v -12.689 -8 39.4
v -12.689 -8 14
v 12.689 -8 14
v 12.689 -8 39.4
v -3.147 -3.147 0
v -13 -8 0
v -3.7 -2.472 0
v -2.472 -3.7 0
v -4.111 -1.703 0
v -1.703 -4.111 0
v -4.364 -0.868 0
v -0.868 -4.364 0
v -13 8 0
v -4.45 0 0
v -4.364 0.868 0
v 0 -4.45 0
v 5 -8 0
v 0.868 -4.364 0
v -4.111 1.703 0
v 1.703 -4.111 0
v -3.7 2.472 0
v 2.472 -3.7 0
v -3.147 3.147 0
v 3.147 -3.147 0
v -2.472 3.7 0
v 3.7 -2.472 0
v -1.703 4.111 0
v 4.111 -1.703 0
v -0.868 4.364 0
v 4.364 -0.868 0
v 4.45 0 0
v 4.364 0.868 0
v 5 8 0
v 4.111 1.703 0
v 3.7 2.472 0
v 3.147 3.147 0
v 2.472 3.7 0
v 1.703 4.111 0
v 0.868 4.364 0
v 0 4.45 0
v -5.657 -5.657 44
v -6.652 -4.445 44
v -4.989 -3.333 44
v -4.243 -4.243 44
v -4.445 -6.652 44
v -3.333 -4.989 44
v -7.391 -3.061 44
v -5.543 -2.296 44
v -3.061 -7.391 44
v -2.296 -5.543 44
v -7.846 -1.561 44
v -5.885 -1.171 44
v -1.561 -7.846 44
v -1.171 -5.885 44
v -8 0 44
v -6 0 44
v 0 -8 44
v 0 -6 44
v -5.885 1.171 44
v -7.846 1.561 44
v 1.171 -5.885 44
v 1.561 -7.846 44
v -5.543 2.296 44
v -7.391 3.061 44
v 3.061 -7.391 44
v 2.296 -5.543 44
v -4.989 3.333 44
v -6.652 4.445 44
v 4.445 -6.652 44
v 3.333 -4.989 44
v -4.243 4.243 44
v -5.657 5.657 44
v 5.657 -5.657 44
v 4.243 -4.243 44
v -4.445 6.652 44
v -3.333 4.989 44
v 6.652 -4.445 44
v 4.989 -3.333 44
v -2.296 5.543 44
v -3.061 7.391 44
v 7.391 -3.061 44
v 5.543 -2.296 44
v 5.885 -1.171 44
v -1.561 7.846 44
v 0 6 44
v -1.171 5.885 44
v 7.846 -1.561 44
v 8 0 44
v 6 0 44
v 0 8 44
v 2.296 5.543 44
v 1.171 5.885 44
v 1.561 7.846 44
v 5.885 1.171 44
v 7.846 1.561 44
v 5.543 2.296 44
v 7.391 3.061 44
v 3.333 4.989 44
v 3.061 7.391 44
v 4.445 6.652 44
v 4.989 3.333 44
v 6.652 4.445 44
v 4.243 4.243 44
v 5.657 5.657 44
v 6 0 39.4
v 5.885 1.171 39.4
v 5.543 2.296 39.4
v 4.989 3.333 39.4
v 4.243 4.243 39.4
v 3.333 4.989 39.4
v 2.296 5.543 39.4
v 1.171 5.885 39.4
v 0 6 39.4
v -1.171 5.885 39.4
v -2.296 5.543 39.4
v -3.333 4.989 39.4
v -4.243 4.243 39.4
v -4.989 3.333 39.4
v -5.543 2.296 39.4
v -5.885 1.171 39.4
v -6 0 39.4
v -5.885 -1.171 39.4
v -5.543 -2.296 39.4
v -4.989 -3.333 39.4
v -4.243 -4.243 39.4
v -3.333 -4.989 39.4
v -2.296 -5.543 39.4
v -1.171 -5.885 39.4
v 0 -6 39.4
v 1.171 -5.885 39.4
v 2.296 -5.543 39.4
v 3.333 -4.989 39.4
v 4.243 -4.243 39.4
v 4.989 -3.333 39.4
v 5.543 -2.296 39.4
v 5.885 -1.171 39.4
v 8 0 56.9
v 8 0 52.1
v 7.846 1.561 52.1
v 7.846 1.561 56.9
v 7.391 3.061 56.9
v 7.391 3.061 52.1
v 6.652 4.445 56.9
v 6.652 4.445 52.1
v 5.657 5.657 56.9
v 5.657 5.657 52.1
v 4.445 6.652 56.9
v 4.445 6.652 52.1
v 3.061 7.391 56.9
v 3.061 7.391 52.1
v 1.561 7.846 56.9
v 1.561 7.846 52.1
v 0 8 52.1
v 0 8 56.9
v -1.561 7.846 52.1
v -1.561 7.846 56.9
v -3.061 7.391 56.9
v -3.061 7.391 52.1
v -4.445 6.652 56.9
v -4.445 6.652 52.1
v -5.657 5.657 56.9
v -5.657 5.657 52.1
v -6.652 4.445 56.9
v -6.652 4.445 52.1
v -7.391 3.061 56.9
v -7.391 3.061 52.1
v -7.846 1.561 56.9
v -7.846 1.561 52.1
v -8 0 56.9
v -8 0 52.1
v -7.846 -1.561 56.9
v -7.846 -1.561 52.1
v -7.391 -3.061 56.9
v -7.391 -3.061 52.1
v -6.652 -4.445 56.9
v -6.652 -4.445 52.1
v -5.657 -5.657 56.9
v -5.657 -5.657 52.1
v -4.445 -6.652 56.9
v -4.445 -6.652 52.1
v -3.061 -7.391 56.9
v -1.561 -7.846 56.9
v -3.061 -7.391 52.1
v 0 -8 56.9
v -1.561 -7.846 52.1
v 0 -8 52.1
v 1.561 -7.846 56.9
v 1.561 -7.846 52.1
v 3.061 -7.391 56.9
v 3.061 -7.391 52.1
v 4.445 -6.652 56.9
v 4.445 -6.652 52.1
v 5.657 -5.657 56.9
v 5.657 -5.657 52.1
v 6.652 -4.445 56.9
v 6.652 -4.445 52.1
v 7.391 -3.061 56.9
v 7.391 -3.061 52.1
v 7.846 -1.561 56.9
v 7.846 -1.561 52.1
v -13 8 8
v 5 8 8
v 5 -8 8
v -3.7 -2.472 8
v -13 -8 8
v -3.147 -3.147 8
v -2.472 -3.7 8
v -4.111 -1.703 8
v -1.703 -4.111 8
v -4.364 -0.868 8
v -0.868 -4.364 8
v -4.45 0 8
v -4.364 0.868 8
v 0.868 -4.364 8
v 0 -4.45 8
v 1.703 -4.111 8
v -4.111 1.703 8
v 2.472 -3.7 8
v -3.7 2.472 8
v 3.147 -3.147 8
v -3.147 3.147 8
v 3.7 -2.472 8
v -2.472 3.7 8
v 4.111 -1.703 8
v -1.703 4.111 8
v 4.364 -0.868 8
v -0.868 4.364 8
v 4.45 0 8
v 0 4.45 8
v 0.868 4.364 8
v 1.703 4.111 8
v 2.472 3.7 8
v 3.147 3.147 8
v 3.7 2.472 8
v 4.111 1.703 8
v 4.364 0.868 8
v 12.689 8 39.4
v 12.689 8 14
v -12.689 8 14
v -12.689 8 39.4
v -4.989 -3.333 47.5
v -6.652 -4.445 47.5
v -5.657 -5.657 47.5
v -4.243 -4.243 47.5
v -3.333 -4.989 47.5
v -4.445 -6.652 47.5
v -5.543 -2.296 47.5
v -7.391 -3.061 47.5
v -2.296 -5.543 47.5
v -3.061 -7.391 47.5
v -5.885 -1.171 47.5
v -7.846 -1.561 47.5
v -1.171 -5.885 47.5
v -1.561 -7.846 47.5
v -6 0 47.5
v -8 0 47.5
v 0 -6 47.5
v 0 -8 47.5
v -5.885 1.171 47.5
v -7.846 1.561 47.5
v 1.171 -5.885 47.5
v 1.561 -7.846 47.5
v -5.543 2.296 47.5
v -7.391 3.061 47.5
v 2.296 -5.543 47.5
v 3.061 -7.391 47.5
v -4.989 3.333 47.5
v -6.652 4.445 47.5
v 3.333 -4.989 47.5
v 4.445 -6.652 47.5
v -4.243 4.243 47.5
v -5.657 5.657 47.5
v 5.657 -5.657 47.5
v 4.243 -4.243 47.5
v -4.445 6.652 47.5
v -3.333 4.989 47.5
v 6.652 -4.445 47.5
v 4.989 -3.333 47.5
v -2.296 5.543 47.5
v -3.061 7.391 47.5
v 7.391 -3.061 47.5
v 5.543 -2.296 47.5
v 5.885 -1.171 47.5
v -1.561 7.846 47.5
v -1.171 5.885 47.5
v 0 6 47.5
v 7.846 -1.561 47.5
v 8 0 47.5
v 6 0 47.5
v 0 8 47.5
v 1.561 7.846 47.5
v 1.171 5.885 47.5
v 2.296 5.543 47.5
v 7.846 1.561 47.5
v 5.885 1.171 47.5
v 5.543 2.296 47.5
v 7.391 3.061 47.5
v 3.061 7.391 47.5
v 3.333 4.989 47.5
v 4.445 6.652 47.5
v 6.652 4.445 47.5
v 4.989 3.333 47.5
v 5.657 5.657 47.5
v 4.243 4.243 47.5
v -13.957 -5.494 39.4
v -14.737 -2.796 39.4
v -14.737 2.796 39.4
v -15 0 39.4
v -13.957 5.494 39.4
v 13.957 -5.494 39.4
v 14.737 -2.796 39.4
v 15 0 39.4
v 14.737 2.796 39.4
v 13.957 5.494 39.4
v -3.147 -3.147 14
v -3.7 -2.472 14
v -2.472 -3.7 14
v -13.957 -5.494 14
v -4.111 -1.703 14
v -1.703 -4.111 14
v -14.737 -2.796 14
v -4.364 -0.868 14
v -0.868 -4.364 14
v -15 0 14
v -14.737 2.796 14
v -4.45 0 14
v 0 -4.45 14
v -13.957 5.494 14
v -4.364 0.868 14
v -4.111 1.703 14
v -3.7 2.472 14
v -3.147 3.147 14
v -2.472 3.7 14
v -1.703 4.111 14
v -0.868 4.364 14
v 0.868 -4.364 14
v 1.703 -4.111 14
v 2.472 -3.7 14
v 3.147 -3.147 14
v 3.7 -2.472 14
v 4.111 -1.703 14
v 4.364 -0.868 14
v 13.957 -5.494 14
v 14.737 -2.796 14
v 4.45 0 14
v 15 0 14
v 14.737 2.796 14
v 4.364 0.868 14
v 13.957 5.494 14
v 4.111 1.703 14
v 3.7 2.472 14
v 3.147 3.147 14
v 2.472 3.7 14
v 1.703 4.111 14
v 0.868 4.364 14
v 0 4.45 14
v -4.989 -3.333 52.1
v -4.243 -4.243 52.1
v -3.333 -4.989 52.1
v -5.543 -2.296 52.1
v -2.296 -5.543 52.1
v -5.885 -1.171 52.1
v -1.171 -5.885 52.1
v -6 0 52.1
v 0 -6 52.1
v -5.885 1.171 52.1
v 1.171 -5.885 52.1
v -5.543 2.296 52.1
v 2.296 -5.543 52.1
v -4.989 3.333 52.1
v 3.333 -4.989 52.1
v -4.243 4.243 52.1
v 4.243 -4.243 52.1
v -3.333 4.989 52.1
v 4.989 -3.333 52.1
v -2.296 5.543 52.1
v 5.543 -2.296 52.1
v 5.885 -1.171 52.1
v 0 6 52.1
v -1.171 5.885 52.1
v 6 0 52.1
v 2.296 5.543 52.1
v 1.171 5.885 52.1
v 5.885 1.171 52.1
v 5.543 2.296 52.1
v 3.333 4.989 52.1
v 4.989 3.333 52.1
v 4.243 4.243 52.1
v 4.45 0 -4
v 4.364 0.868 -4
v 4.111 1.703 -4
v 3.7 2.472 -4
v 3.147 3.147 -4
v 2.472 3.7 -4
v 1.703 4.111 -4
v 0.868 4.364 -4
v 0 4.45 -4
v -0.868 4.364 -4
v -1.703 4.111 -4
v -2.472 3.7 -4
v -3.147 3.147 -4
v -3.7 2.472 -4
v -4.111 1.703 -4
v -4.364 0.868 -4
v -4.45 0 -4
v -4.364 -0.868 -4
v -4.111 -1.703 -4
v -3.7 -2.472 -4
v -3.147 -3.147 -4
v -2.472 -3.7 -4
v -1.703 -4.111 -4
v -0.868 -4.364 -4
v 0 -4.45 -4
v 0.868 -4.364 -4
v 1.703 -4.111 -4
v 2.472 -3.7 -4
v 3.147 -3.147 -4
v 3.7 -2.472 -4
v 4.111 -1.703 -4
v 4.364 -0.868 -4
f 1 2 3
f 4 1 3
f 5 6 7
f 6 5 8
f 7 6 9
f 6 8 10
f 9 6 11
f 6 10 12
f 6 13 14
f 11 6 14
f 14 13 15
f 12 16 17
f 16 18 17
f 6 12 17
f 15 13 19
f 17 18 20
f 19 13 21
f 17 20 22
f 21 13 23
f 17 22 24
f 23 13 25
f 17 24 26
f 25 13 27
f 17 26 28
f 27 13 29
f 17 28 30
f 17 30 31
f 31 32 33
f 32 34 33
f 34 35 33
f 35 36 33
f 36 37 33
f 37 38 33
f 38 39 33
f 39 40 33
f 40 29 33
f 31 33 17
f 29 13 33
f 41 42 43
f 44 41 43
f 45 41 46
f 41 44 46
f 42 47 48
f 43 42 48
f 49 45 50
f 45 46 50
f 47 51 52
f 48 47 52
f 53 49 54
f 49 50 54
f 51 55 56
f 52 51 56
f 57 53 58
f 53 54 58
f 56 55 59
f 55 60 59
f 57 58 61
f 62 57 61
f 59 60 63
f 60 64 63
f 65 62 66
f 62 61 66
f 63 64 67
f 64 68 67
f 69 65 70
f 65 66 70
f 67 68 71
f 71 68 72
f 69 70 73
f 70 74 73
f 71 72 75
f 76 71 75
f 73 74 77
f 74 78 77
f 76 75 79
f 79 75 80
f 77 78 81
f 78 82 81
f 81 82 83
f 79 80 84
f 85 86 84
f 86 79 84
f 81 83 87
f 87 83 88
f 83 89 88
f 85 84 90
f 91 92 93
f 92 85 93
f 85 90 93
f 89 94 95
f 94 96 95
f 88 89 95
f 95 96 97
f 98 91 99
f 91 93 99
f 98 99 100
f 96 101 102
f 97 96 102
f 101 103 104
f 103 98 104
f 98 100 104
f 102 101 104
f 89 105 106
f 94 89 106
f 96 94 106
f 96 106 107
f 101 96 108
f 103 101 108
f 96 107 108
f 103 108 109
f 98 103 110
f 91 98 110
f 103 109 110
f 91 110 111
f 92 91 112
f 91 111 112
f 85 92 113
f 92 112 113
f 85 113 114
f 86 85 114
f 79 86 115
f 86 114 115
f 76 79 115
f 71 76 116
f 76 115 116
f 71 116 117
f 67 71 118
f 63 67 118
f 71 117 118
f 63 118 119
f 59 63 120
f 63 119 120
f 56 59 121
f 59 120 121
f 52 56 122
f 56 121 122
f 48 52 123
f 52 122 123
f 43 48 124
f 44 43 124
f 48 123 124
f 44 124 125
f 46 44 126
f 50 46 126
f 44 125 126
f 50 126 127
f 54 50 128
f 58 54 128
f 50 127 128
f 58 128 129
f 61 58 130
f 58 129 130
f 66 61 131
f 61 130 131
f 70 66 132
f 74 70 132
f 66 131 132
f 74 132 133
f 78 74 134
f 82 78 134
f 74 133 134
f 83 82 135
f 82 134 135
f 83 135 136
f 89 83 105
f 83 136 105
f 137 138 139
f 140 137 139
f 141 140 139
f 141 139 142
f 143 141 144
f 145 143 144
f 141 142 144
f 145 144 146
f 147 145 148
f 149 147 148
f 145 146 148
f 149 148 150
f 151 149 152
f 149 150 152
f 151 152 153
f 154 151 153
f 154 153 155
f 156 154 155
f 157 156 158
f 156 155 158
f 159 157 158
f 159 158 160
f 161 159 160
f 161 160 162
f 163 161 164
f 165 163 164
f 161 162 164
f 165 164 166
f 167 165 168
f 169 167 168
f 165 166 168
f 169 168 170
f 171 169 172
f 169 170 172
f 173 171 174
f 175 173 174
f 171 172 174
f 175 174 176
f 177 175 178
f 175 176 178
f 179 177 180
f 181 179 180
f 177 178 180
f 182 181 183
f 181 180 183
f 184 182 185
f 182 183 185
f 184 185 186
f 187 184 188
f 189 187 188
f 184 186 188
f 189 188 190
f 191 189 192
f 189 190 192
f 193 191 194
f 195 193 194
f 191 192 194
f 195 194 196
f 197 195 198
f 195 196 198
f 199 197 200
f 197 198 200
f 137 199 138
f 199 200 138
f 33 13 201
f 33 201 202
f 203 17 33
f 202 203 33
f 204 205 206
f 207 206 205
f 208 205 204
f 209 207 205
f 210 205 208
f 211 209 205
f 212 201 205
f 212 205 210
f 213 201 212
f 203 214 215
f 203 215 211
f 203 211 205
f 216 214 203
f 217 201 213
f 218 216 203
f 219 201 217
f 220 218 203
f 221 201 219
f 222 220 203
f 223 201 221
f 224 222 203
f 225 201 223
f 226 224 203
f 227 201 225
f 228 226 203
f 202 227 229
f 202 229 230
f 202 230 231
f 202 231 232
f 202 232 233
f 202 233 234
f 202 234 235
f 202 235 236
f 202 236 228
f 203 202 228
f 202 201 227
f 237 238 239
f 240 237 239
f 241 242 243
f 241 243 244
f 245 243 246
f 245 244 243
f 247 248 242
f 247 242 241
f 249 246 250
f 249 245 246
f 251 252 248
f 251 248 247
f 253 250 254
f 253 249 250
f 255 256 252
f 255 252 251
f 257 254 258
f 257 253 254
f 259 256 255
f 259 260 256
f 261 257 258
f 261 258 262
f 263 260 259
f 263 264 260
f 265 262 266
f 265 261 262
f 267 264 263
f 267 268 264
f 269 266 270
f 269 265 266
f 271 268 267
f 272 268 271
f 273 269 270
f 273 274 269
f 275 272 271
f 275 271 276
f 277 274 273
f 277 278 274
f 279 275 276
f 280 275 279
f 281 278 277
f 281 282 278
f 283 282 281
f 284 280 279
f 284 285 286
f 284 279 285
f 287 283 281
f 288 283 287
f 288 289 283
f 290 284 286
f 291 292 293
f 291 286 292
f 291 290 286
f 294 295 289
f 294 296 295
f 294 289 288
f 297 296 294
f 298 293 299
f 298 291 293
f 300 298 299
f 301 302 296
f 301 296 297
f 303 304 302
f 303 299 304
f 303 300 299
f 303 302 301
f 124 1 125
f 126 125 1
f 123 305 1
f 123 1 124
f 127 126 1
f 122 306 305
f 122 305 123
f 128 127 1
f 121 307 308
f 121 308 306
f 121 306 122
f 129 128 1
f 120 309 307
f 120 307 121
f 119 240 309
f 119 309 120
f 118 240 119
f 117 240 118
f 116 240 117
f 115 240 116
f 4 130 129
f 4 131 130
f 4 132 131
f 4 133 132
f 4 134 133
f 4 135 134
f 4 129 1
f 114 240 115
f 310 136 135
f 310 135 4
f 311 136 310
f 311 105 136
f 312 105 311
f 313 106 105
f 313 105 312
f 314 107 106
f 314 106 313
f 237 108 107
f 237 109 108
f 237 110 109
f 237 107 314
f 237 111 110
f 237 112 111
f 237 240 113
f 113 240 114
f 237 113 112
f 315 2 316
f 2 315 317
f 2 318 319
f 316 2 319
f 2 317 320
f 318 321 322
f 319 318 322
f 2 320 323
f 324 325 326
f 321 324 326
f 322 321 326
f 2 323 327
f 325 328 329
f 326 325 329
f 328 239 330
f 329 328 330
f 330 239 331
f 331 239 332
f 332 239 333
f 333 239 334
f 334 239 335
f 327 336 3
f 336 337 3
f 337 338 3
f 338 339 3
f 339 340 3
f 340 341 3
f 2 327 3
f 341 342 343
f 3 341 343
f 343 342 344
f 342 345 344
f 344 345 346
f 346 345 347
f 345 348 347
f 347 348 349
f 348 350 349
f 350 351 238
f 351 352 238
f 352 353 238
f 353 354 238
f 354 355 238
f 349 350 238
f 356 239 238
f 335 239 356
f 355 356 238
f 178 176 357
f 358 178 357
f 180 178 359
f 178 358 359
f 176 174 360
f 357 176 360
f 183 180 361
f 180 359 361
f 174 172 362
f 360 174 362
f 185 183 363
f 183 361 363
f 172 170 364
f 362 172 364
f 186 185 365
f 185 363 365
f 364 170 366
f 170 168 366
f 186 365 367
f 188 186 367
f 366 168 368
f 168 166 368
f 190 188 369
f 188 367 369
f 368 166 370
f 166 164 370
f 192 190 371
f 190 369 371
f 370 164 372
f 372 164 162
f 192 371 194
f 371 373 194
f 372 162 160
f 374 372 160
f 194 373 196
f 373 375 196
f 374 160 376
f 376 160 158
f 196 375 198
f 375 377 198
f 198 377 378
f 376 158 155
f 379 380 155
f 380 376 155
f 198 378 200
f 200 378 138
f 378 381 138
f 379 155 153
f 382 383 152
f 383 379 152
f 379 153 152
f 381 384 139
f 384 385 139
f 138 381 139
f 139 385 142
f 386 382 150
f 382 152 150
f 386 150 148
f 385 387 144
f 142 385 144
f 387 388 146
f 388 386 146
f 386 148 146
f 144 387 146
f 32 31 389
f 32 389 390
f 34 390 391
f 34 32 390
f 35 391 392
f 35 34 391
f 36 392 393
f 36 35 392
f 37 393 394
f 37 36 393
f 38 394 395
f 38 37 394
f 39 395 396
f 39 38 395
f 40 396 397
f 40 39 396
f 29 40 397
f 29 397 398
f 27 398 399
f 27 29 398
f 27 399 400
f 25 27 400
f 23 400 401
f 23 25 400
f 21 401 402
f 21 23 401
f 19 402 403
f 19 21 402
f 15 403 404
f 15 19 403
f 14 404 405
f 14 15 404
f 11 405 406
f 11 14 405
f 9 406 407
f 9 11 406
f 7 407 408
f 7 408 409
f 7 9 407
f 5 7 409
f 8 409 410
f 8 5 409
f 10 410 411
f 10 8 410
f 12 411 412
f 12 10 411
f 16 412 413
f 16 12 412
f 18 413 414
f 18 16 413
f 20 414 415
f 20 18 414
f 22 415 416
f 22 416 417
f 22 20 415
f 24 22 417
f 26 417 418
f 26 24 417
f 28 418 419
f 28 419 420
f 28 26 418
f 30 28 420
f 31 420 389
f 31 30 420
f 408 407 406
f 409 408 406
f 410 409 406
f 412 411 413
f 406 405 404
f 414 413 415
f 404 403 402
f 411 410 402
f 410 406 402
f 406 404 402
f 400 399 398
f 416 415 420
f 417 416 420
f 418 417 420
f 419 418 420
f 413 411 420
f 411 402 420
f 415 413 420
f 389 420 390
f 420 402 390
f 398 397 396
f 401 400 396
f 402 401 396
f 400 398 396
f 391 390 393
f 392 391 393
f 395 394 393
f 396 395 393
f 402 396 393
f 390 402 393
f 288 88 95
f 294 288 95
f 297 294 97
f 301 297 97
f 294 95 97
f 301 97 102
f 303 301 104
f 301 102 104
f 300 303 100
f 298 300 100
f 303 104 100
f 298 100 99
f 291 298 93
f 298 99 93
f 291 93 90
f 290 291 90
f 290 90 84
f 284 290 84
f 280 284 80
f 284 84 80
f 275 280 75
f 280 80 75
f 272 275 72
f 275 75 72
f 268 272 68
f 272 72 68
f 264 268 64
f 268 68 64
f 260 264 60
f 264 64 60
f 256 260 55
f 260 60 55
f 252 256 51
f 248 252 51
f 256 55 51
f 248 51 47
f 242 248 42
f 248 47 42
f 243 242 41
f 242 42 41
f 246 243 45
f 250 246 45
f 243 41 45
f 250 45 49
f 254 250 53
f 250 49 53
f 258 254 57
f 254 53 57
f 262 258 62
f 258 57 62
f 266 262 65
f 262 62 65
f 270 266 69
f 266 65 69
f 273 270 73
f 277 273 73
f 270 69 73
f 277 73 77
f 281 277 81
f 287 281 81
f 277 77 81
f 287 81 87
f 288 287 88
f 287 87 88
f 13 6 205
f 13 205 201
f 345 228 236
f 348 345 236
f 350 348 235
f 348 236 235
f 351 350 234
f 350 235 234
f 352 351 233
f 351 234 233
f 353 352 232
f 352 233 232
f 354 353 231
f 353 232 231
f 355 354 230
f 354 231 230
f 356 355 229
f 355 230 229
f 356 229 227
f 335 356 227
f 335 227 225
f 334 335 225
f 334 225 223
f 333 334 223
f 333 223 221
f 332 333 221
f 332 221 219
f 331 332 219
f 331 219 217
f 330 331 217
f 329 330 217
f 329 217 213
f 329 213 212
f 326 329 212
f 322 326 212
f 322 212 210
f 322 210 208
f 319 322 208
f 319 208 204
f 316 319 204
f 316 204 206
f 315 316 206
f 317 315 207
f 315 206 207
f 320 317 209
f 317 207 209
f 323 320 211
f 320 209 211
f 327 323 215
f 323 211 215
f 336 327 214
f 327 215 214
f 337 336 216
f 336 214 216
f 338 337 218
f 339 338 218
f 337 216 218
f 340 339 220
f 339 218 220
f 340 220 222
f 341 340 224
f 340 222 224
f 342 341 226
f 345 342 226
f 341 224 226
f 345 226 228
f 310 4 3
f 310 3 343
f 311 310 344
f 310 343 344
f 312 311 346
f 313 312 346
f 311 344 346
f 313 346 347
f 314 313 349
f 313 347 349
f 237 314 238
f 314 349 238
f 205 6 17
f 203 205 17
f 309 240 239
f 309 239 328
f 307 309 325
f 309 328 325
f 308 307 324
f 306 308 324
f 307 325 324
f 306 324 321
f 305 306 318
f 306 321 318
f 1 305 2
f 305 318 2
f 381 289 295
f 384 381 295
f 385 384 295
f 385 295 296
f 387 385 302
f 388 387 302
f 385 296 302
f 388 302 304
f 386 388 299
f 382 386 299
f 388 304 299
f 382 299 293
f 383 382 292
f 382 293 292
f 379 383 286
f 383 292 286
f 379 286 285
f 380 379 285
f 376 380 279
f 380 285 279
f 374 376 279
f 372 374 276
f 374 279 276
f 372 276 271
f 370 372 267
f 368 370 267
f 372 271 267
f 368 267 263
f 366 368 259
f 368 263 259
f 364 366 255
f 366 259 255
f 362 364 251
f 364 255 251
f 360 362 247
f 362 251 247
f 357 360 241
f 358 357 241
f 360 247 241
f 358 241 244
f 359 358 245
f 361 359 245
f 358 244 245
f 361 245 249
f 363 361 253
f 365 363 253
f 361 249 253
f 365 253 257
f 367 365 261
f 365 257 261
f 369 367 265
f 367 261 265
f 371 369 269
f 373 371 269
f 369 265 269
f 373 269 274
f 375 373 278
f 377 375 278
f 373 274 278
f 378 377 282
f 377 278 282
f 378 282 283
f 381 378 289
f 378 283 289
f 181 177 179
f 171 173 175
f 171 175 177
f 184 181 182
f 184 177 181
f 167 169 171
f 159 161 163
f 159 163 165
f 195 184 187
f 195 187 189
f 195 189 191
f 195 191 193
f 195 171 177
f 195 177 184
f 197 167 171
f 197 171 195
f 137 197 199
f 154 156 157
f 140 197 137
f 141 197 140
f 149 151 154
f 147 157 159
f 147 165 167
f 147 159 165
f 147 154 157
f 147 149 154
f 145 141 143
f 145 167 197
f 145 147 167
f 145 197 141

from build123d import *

# Parameters (mm, degrees)
F0_W          = 18
F0_H          = 16
F1_DEPTH      = 8
F2_R          = 4.45
F3_DEPTH      = 14
F3_DEPTH_BACK = 4
F5_DEPTH      = 25.4
F6_R          = 6
F7_DEPTH      = 4.6
F8_R          = 8
F9_DEPTH      = 3.5
F10_R         = 6
F11_DEPTH     = 4.6
F12_R         = 8
F13_DEPTH     = 4.8


with BuildPart() as f1:
    # F0 (on Top) → F1 (new body)
    with BuildSketch(Plane.XY):
        with Locations((-4, 0)):
            Rectangle(F0_W, F0_H)
    extrude(amount=F1_DEPTH)

    # F2 (on Top) → F3 (join, two sides)
    with BuildSketch(Plane.XY) as f3_sk:
        Circle(F2_R)
    extrude(amount=F3_DEPTH)
    extrude(f3_sk.sketch, amount=-F3_DEPTH_BACK)

    # F4 (on face) → F5 (join)
    with BuildSketch(Plane.XY.offset(14)):
        with BuildLine():
            Line((12.6885775404, 8), (-12.6885775404, 8))
            ThreePointArc((-12.6885775404, 8), (-15, 0), (-12.6885775404, -8))
            Line((-12.6885775404, -8), (12.6885775404, -8))
            ThreePointArc((12.6885775404, -8), (15, 0), (12.6885775404, 8))
        make_face()
    extrude(amount=F5_DEPTH)

    # F6 (on face) → F7 (join)
    with BuildSketch(Plane.XY.offset(39.4)):
        Circle(F6_R)
    extrude(amount=F7_DEPTH)

    # F8 (on face) → F9 (join)
    with BuildSketch(Plane.XY.offset(44)):
        Circle(F8_R)
    extrude(amount=F9_DEPTH)

    # F10 (on face) → F11 (join)
    with BuildSketch(Plane.XY.offset(47.5)):
        Circle(F10_R)
    extrude(amount=F11_DEPTH)

    # F12 (on face) → F13 (join)
    with BuildSketch(Plane.XY.offset(52.1)):
        Circle(F12_R)
    extrude(amount=F13_DEPTH)


solid = f1.part
